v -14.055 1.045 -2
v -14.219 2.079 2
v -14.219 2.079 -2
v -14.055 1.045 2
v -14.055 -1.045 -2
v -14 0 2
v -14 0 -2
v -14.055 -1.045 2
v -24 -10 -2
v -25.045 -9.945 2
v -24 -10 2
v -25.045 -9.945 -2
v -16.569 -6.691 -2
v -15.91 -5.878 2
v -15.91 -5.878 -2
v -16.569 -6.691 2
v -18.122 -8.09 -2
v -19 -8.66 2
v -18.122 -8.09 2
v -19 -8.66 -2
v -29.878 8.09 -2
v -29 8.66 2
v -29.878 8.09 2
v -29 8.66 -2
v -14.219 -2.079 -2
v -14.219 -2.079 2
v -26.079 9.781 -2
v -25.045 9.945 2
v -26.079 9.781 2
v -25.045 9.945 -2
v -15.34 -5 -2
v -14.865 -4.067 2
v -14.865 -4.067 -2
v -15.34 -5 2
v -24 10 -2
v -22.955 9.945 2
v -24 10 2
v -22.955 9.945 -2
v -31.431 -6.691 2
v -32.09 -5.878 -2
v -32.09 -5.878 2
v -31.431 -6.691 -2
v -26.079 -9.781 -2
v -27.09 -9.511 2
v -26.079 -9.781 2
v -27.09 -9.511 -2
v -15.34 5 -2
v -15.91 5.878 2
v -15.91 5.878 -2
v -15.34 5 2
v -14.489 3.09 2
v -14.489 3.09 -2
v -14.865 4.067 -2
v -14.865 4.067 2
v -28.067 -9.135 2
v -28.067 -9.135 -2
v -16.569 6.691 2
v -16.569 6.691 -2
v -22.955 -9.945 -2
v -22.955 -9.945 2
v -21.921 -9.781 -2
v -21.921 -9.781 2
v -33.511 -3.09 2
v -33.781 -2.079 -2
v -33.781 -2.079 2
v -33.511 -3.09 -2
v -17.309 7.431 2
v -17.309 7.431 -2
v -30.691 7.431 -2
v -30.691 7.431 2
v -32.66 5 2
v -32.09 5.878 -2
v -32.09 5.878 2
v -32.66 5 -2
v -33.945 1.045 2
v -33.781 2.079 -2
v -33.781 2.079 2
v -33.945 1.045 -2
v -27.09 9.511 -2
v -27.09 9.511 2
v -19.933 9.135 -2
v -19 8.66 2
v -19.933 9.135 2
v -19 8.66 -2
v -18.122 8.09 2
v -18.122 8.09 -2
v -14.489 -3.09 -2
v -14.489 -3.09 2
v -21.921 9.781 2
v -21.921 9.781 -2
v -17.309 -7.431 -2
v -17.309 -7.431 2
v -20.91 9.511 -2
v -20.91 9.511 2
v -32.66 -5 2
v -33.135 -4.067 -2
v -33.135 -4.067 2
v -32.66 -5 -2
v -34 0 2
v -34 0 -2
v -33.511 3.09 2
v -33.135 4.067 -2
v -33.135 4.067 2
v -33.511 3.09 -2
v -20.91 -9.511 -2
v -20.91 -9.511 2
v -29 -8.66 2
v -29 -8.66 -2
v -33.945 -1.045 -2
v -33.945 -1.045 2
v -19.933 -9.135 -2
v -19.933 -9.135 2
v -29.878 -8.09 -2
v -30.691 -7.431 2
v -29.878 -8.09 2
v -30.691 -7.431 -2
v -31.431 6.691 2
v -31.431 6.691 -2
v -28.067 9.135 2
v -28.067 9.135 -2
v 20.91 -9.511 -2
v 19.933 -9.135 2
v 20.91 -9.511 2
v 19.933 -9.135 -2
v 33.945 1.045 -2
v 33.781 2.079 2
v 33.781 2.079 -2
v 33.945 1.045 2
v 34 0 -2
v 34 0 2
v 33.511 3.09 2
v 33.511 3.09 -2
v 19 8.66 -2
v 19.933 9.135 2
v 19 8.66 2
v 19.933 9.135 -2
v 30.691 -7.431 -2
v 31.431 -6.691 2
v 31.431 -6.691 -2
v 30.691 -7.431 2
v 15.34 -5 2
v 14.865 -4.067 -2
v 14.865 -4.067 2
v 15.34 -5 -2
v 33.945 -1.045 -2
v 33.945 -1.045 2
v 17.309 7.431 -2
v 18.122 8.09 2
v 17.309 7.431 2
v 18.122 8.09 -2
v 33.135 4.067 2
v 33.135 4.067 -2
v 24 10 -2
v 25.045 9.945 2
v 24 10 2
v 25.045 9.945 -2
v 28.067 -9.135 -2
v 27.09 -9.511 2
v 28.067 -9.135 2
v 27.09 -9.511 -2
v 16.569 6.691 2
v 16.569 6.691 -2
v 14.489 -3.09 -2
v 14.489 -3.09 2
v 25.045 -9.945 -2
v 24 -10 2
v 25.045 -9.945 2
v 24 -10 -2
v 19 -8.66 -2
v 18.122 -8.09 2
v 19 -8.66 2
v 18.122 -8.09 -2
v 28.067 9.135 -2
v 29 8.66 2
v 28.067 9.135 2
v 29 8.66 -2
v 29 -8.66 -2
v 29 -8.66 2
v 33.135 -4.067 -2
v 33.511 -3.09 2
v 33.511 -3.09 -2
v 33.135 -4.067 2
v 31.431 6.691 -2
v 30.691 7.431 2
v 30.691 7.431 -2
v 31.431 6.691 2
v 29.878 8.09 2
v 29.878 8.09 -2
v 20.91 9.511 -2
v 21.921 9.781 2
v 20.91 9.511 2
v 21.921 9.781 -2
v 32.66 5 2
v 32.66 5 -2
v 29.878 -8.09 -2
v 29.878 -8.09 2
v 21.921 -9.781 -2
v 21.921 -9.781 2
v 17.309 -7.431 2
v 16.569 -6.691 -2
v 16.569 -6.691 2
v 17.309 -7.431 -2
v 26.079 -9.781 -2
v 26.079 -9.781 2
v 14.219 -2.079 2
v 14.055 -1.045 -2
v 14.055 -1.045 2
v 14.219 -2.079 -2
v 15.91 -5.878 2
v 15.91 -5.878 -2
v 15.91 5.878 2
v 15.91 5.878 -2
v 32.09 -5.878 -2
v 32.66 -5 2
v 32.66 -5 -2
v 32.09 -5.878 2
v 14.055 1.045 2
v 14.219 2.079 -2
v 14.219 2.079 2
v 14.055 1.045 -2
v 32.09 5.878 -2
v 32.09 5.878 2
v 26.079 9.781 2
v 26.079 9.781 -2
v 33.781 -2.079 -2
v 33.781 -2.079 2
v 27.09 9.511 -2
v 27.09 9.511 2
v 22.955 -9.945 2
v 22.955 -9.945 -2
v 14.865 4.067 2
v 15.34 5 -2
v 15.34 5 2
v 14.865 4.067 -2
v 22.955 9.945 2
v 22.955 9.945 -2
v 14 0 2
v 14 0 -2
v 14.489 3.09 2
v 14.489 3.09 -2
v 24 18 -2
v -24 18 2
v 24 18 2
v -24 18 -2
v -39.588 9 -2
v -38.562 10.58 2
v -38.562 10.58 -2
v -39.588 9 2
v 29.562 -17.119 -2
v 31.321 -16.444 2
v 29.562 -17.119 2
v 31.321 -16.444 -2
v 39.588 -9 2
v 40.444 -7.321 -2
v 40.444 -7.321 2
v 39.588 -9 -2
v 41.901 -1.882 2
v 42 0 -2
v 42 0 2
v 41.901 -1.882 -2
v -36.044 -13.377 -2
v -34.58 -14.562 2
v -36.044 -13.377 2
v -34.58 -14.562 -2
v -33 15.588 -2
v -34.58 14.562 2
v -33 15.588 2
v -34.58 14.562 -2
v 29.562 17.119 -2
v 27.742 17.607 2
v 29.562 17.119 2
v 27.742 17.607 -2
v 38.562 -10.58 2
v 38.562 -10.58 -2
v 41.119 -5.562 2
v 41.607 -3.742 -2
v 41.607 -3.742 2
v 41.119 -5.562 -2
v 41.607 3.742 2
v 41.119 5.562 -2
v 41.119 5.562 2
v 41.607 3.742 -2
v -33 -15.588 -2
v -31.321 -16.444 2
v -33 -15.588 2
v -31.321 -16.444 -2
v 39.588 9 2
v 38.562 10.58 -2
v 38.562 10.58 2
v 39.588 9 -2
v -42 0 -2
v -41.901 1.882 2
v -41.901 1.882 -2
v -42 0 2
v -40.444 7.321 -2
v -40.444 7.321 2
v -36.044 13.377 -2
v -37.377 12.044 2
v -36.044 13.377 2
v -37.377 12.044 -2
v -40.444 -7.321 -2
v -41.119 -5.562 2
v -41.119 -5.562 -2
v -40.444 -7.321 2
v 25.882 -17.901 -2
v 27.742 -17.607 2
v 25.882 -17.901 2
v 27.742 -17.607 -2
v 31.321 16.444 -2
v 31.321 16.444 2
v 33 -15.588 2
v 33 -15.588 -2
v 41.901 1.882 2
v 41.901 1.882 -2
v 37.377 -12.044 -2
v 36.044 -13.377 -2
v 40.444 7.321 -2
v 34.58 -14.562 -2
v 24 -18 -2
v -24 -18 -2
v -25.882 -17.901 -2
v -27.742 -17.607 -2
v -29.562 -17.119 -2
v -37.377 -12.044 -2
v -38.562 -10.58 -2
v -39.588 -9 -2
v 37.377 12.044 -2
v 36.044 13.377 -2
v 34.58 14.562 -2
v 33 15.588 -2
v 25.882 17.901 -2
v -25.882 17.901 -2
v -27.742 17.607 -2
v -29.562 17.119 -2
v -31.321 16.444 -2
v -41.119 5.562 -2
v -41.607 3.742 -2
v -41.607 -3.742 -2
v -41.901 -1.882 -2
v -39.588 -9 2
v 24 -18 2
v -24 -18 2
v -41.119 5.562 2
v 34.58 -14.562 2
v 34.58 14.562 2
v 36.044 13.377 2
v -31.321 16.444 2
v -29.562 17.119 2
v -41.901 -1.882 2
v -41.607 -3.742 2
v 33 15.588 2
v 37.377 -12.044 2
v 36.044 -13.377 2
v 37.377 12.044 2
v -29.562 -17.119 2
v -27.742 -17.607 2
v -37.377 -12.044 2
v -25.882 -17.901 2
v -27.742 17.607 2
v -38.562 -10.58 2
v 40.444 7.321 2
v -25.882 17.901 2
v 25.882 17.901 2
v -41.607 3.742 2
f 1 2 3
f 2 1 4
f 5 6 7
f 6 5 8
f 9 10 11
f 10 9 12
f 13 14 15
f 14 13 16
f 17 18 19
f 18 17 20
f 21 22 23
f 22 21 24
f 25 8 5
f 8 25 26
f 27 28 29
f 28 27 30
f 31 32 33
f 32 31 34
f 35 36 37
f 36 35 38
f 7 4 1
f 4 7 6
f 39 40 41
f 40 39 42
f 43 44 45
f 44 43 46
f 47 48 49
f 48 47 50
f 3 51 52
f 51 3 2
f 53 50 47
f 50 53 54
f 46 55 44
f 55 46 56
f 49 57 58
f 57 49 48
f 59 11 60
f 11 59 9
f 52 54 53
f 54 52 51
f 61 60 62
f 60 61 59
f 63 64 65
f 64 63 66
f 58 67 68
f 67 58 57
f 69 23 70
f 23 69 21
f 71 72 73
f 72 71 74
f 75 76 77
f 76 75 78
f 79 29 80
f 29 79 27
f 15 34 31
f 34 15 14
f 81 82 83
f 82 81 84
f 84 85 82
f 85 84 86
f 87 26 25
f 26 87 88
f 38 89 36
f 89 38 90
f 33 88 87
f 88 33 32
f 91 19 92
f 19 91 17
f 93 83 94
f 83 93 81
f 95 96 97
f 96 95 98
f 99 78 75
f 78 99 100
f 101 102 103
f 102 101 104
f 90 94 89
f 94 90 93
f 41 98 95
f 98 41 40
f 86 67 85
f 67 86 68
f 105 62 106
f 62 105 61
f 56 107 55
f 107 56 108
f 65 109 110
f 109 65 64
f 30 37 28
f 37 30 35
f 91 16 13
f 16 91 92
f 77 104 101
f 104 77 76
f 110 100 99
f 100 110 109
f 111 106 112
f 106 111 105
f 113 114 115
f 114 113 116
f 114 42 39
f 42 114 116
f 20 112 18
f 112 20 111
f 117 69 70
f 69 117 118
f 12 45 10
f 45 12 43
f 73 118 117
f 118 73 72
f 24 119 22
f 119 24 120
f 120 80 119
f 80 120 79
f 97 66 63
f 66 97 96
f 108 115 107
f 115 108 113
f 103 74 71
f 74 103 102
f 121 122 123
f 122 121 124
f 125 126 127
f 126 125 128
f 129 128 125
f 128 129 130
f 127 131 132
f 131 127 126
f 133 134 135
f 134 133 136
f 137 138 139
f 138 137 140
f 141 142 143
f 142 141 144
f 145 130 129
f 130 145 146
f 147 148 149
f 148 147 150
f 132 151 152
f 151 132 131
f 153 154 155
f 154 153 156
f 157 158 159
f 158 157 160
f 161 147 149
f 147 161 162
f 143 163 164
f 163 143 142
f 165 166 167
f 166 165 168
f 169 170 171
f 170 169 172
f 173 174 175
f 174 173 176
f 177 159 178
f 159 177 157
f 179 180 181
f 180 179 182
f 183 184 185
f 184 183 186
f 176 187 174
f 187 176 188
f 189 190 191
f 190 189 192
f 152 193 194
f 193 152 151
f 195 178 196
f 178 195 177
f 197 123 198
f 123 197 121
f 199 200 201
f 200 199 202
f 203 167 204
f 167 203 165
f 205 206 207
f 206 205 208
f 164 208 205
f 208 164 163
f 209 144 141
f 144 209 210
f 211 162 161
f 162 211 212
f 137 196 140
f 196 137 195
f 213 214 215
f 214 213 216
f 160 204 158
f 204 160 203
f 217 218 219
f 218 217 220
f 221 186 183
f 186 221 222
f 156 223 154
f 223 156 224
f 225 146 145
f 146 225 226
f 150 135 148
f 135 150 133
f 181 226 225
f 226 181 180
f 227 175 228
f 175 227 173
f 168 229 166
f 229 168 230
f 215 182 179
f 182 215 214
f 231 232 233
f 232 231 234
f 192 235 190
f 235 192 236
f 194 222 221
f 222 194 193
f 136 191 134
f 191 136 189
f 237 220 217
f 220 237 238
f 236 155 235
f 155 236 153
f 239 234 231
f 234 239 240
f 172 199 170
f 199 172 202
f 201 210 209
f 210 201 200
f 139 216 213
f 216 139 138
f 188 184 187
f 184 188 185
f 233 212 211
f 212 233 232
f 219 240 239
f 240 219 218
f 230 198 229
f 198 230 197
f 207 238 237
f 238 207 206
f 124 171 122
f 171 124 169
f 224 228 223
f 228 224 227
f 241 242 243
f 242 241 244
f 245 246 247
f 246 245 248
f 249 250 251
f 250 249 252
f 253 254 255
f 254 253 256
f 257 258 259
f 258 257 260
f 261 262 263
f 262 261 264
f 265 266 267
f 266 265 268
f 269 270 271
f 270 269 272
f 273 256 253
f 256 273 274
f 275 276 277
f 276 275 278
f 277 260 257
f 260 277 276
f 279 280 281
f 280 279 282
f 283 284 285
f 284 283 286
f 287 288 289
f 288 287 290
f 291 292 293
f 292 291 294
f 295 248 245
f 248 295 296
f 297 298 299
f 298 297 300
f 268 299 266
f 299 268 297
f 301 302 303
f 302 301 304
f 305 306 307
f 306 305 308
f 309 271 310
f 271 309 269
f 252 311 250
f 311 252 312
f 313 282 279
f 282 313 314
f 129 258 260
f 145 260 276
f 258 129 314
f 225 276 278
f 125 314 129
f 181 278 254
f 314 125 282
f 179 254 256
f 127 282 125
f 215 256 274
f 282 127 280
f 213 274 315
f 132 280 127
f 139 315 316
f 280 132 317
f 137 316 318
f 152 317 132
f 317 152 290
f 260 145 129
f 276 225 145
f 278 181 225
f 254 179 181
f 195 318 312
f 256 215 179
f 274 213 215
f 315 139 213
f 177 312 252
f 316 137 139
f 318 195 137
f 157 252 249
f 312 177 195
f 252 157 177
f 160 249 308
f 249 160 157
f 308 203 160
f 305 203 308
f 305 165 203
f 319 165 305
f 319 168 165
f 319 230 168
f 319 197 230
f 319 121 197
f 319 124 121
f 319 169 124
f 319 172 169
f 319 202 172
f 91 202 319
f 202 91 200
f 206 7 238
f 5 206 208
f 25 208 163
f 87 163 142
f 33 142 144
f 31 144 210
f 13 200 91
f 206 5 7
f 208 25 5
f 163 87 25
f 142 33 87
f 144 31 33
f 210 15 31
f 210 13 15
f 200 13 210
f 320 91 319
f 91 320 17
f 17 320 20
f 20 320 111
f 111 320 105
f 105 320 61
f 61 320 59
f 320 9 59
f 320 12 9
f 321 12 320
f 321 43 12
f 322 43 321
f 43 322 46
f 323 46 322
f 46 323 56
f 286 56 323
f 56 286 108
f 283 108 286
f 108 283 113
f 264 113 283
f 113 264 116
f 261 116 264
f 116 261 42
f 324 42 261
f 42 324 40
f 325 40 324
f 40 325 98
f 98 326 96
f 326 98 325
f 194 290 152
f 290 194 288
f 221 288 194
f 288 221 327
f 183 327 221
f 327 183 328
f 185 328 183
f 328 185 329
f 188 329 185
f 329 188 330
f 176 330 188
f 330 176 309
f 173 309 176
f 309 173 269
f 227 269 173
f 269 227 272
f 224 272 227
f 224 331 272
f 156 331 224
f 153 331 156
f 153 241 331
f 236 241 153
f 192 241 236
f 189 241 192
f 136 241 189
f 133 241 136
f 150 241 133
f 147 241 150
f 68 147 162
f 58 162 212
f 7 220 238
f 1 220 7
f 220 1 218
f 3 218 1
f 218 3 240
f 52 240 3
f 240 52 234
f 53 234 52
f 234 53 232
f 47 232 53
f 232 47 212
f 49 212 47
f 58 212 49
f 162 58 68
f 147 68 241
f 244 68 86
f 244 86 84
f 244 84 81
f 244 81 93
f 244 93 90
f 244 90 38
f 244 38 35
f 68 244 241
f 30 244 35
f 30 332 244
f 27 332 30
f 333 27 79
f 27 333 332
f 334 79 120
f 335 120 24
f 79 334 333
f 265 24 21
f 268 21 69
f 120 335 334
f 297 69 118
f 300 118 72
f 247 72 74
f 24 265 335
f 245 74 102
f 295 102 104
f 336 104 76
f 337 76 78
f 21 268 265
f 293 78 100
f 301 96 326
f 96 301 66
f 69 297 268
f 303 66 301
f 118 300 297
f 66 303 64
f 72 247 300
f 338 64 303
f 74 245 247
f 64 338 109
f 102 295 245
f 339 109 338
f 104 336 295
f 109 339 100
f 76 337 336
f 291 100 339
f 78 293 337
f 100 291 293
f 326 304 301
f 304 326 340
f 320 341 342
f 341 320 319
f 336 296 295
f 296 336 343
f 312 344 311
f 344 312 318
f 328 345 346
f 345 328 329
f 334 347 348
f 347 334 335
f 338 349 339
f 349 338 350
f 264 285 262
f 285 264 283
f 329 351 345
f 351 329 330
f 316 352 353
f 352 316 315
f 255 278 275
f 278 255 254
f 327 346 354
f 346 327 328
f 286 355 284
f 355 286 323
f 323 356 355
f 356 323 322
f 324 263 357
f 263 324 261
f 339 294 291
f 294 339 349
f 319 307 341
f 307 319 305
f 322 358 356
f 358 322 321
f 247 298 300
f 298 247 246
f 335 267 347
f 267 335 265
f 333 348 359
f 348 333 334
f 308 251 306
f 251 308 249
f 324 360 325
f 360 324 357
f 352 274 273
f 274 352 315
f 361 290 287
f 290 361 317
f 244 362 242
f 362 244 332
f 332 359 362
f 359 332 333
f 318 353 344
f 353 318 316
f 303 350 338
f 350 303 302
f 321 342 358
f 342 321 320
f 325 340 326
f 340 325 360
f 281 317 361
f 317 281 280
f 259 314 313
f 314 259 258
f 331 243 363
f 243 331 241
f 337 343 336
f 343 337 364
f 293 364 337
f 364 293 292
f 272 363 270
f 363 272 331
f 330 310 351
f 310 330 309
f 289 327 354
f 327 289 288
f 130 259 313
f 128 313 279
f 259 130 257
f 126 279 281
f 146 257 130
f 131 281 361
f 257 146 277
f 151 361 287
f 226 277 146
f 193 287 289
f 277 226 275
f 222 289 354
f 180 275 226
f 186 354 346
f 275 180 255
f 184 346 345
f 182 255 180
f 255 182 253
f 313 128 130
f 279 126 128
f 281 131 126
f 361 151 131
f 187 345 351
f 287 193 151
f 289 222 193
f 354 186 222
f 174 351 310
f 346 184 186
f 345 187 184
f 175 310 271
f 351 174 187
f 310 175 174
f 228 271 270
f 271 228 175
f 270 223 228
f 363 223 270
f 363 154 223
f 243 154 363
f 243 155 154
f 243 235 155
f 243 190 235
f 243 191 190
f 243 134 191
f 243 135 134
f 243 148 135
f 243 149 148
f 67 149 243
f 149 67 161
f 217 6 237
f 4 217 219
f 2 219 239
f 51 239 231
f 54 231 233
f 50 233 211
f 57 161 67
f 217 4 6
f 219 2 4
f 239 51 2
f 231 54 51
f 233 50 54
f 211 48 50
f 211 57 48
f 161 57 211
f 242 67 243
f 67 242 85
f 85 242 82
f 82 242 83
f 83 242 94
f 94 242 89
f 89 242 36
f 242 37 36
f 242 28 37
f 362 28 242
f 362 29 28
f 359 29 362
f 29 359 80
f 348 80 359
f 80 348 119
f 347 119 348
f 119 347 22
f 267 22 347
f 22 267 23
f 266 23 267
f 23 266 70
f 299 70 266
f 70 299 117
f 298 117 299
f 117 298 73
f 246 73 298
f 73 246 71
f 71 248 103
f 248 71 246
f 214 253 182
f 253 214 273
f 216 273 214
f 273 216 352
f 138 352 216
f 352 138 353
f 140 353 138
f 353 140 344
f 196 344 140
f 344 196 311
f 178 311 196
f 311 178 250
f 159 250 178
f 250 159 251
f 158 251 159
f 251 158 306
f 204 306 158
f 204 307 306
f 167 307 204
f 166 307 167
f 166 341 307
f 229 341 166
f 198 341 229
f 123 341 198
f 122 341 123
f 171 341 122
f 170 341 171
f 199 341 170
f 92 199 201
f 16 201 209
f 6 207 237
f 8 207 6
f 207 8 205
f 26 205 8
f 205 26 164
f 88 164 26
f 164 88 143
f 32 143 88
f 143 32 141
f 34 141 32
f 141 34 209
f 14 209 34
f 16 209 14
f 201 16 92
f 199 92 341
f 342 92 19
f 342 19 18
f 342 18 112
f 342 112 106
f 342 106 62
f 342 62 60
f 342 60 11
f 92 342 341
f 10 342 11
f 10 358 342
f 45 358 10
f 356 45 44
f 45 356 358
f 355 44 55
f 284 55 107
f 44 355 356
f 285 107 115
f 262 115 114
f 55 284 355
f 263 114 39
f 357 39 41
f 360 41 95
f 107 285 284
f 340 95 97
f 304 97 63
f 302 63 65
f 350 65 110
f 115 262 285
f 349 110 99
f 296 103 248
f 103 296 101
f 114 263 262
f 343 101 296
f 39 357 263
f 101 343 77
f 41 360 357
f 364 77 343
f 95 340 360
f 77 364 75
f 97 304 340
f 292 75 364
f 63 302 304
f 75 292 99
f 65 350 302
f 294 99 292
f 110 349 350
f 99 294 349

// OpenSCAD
// Two-hole link plate.
$fn = 60;
eps = 0.02;
hole_d = 20;
length = 84;
width = 36;
thickness = 4;
difference() { hull() { translate([-length/2+width/2,0,0]) cylinder(d=width,h=thickness,center=true); translate([length/2-width/2,0,0]) cylinder(d=width,h=thickness,center=true); } for(x=[-length/2+width/2,length/2-width/2]) translate([x,0,-thickness/2-eps]) cylinder(d=hole_d,h=thickness+2*eps); }
